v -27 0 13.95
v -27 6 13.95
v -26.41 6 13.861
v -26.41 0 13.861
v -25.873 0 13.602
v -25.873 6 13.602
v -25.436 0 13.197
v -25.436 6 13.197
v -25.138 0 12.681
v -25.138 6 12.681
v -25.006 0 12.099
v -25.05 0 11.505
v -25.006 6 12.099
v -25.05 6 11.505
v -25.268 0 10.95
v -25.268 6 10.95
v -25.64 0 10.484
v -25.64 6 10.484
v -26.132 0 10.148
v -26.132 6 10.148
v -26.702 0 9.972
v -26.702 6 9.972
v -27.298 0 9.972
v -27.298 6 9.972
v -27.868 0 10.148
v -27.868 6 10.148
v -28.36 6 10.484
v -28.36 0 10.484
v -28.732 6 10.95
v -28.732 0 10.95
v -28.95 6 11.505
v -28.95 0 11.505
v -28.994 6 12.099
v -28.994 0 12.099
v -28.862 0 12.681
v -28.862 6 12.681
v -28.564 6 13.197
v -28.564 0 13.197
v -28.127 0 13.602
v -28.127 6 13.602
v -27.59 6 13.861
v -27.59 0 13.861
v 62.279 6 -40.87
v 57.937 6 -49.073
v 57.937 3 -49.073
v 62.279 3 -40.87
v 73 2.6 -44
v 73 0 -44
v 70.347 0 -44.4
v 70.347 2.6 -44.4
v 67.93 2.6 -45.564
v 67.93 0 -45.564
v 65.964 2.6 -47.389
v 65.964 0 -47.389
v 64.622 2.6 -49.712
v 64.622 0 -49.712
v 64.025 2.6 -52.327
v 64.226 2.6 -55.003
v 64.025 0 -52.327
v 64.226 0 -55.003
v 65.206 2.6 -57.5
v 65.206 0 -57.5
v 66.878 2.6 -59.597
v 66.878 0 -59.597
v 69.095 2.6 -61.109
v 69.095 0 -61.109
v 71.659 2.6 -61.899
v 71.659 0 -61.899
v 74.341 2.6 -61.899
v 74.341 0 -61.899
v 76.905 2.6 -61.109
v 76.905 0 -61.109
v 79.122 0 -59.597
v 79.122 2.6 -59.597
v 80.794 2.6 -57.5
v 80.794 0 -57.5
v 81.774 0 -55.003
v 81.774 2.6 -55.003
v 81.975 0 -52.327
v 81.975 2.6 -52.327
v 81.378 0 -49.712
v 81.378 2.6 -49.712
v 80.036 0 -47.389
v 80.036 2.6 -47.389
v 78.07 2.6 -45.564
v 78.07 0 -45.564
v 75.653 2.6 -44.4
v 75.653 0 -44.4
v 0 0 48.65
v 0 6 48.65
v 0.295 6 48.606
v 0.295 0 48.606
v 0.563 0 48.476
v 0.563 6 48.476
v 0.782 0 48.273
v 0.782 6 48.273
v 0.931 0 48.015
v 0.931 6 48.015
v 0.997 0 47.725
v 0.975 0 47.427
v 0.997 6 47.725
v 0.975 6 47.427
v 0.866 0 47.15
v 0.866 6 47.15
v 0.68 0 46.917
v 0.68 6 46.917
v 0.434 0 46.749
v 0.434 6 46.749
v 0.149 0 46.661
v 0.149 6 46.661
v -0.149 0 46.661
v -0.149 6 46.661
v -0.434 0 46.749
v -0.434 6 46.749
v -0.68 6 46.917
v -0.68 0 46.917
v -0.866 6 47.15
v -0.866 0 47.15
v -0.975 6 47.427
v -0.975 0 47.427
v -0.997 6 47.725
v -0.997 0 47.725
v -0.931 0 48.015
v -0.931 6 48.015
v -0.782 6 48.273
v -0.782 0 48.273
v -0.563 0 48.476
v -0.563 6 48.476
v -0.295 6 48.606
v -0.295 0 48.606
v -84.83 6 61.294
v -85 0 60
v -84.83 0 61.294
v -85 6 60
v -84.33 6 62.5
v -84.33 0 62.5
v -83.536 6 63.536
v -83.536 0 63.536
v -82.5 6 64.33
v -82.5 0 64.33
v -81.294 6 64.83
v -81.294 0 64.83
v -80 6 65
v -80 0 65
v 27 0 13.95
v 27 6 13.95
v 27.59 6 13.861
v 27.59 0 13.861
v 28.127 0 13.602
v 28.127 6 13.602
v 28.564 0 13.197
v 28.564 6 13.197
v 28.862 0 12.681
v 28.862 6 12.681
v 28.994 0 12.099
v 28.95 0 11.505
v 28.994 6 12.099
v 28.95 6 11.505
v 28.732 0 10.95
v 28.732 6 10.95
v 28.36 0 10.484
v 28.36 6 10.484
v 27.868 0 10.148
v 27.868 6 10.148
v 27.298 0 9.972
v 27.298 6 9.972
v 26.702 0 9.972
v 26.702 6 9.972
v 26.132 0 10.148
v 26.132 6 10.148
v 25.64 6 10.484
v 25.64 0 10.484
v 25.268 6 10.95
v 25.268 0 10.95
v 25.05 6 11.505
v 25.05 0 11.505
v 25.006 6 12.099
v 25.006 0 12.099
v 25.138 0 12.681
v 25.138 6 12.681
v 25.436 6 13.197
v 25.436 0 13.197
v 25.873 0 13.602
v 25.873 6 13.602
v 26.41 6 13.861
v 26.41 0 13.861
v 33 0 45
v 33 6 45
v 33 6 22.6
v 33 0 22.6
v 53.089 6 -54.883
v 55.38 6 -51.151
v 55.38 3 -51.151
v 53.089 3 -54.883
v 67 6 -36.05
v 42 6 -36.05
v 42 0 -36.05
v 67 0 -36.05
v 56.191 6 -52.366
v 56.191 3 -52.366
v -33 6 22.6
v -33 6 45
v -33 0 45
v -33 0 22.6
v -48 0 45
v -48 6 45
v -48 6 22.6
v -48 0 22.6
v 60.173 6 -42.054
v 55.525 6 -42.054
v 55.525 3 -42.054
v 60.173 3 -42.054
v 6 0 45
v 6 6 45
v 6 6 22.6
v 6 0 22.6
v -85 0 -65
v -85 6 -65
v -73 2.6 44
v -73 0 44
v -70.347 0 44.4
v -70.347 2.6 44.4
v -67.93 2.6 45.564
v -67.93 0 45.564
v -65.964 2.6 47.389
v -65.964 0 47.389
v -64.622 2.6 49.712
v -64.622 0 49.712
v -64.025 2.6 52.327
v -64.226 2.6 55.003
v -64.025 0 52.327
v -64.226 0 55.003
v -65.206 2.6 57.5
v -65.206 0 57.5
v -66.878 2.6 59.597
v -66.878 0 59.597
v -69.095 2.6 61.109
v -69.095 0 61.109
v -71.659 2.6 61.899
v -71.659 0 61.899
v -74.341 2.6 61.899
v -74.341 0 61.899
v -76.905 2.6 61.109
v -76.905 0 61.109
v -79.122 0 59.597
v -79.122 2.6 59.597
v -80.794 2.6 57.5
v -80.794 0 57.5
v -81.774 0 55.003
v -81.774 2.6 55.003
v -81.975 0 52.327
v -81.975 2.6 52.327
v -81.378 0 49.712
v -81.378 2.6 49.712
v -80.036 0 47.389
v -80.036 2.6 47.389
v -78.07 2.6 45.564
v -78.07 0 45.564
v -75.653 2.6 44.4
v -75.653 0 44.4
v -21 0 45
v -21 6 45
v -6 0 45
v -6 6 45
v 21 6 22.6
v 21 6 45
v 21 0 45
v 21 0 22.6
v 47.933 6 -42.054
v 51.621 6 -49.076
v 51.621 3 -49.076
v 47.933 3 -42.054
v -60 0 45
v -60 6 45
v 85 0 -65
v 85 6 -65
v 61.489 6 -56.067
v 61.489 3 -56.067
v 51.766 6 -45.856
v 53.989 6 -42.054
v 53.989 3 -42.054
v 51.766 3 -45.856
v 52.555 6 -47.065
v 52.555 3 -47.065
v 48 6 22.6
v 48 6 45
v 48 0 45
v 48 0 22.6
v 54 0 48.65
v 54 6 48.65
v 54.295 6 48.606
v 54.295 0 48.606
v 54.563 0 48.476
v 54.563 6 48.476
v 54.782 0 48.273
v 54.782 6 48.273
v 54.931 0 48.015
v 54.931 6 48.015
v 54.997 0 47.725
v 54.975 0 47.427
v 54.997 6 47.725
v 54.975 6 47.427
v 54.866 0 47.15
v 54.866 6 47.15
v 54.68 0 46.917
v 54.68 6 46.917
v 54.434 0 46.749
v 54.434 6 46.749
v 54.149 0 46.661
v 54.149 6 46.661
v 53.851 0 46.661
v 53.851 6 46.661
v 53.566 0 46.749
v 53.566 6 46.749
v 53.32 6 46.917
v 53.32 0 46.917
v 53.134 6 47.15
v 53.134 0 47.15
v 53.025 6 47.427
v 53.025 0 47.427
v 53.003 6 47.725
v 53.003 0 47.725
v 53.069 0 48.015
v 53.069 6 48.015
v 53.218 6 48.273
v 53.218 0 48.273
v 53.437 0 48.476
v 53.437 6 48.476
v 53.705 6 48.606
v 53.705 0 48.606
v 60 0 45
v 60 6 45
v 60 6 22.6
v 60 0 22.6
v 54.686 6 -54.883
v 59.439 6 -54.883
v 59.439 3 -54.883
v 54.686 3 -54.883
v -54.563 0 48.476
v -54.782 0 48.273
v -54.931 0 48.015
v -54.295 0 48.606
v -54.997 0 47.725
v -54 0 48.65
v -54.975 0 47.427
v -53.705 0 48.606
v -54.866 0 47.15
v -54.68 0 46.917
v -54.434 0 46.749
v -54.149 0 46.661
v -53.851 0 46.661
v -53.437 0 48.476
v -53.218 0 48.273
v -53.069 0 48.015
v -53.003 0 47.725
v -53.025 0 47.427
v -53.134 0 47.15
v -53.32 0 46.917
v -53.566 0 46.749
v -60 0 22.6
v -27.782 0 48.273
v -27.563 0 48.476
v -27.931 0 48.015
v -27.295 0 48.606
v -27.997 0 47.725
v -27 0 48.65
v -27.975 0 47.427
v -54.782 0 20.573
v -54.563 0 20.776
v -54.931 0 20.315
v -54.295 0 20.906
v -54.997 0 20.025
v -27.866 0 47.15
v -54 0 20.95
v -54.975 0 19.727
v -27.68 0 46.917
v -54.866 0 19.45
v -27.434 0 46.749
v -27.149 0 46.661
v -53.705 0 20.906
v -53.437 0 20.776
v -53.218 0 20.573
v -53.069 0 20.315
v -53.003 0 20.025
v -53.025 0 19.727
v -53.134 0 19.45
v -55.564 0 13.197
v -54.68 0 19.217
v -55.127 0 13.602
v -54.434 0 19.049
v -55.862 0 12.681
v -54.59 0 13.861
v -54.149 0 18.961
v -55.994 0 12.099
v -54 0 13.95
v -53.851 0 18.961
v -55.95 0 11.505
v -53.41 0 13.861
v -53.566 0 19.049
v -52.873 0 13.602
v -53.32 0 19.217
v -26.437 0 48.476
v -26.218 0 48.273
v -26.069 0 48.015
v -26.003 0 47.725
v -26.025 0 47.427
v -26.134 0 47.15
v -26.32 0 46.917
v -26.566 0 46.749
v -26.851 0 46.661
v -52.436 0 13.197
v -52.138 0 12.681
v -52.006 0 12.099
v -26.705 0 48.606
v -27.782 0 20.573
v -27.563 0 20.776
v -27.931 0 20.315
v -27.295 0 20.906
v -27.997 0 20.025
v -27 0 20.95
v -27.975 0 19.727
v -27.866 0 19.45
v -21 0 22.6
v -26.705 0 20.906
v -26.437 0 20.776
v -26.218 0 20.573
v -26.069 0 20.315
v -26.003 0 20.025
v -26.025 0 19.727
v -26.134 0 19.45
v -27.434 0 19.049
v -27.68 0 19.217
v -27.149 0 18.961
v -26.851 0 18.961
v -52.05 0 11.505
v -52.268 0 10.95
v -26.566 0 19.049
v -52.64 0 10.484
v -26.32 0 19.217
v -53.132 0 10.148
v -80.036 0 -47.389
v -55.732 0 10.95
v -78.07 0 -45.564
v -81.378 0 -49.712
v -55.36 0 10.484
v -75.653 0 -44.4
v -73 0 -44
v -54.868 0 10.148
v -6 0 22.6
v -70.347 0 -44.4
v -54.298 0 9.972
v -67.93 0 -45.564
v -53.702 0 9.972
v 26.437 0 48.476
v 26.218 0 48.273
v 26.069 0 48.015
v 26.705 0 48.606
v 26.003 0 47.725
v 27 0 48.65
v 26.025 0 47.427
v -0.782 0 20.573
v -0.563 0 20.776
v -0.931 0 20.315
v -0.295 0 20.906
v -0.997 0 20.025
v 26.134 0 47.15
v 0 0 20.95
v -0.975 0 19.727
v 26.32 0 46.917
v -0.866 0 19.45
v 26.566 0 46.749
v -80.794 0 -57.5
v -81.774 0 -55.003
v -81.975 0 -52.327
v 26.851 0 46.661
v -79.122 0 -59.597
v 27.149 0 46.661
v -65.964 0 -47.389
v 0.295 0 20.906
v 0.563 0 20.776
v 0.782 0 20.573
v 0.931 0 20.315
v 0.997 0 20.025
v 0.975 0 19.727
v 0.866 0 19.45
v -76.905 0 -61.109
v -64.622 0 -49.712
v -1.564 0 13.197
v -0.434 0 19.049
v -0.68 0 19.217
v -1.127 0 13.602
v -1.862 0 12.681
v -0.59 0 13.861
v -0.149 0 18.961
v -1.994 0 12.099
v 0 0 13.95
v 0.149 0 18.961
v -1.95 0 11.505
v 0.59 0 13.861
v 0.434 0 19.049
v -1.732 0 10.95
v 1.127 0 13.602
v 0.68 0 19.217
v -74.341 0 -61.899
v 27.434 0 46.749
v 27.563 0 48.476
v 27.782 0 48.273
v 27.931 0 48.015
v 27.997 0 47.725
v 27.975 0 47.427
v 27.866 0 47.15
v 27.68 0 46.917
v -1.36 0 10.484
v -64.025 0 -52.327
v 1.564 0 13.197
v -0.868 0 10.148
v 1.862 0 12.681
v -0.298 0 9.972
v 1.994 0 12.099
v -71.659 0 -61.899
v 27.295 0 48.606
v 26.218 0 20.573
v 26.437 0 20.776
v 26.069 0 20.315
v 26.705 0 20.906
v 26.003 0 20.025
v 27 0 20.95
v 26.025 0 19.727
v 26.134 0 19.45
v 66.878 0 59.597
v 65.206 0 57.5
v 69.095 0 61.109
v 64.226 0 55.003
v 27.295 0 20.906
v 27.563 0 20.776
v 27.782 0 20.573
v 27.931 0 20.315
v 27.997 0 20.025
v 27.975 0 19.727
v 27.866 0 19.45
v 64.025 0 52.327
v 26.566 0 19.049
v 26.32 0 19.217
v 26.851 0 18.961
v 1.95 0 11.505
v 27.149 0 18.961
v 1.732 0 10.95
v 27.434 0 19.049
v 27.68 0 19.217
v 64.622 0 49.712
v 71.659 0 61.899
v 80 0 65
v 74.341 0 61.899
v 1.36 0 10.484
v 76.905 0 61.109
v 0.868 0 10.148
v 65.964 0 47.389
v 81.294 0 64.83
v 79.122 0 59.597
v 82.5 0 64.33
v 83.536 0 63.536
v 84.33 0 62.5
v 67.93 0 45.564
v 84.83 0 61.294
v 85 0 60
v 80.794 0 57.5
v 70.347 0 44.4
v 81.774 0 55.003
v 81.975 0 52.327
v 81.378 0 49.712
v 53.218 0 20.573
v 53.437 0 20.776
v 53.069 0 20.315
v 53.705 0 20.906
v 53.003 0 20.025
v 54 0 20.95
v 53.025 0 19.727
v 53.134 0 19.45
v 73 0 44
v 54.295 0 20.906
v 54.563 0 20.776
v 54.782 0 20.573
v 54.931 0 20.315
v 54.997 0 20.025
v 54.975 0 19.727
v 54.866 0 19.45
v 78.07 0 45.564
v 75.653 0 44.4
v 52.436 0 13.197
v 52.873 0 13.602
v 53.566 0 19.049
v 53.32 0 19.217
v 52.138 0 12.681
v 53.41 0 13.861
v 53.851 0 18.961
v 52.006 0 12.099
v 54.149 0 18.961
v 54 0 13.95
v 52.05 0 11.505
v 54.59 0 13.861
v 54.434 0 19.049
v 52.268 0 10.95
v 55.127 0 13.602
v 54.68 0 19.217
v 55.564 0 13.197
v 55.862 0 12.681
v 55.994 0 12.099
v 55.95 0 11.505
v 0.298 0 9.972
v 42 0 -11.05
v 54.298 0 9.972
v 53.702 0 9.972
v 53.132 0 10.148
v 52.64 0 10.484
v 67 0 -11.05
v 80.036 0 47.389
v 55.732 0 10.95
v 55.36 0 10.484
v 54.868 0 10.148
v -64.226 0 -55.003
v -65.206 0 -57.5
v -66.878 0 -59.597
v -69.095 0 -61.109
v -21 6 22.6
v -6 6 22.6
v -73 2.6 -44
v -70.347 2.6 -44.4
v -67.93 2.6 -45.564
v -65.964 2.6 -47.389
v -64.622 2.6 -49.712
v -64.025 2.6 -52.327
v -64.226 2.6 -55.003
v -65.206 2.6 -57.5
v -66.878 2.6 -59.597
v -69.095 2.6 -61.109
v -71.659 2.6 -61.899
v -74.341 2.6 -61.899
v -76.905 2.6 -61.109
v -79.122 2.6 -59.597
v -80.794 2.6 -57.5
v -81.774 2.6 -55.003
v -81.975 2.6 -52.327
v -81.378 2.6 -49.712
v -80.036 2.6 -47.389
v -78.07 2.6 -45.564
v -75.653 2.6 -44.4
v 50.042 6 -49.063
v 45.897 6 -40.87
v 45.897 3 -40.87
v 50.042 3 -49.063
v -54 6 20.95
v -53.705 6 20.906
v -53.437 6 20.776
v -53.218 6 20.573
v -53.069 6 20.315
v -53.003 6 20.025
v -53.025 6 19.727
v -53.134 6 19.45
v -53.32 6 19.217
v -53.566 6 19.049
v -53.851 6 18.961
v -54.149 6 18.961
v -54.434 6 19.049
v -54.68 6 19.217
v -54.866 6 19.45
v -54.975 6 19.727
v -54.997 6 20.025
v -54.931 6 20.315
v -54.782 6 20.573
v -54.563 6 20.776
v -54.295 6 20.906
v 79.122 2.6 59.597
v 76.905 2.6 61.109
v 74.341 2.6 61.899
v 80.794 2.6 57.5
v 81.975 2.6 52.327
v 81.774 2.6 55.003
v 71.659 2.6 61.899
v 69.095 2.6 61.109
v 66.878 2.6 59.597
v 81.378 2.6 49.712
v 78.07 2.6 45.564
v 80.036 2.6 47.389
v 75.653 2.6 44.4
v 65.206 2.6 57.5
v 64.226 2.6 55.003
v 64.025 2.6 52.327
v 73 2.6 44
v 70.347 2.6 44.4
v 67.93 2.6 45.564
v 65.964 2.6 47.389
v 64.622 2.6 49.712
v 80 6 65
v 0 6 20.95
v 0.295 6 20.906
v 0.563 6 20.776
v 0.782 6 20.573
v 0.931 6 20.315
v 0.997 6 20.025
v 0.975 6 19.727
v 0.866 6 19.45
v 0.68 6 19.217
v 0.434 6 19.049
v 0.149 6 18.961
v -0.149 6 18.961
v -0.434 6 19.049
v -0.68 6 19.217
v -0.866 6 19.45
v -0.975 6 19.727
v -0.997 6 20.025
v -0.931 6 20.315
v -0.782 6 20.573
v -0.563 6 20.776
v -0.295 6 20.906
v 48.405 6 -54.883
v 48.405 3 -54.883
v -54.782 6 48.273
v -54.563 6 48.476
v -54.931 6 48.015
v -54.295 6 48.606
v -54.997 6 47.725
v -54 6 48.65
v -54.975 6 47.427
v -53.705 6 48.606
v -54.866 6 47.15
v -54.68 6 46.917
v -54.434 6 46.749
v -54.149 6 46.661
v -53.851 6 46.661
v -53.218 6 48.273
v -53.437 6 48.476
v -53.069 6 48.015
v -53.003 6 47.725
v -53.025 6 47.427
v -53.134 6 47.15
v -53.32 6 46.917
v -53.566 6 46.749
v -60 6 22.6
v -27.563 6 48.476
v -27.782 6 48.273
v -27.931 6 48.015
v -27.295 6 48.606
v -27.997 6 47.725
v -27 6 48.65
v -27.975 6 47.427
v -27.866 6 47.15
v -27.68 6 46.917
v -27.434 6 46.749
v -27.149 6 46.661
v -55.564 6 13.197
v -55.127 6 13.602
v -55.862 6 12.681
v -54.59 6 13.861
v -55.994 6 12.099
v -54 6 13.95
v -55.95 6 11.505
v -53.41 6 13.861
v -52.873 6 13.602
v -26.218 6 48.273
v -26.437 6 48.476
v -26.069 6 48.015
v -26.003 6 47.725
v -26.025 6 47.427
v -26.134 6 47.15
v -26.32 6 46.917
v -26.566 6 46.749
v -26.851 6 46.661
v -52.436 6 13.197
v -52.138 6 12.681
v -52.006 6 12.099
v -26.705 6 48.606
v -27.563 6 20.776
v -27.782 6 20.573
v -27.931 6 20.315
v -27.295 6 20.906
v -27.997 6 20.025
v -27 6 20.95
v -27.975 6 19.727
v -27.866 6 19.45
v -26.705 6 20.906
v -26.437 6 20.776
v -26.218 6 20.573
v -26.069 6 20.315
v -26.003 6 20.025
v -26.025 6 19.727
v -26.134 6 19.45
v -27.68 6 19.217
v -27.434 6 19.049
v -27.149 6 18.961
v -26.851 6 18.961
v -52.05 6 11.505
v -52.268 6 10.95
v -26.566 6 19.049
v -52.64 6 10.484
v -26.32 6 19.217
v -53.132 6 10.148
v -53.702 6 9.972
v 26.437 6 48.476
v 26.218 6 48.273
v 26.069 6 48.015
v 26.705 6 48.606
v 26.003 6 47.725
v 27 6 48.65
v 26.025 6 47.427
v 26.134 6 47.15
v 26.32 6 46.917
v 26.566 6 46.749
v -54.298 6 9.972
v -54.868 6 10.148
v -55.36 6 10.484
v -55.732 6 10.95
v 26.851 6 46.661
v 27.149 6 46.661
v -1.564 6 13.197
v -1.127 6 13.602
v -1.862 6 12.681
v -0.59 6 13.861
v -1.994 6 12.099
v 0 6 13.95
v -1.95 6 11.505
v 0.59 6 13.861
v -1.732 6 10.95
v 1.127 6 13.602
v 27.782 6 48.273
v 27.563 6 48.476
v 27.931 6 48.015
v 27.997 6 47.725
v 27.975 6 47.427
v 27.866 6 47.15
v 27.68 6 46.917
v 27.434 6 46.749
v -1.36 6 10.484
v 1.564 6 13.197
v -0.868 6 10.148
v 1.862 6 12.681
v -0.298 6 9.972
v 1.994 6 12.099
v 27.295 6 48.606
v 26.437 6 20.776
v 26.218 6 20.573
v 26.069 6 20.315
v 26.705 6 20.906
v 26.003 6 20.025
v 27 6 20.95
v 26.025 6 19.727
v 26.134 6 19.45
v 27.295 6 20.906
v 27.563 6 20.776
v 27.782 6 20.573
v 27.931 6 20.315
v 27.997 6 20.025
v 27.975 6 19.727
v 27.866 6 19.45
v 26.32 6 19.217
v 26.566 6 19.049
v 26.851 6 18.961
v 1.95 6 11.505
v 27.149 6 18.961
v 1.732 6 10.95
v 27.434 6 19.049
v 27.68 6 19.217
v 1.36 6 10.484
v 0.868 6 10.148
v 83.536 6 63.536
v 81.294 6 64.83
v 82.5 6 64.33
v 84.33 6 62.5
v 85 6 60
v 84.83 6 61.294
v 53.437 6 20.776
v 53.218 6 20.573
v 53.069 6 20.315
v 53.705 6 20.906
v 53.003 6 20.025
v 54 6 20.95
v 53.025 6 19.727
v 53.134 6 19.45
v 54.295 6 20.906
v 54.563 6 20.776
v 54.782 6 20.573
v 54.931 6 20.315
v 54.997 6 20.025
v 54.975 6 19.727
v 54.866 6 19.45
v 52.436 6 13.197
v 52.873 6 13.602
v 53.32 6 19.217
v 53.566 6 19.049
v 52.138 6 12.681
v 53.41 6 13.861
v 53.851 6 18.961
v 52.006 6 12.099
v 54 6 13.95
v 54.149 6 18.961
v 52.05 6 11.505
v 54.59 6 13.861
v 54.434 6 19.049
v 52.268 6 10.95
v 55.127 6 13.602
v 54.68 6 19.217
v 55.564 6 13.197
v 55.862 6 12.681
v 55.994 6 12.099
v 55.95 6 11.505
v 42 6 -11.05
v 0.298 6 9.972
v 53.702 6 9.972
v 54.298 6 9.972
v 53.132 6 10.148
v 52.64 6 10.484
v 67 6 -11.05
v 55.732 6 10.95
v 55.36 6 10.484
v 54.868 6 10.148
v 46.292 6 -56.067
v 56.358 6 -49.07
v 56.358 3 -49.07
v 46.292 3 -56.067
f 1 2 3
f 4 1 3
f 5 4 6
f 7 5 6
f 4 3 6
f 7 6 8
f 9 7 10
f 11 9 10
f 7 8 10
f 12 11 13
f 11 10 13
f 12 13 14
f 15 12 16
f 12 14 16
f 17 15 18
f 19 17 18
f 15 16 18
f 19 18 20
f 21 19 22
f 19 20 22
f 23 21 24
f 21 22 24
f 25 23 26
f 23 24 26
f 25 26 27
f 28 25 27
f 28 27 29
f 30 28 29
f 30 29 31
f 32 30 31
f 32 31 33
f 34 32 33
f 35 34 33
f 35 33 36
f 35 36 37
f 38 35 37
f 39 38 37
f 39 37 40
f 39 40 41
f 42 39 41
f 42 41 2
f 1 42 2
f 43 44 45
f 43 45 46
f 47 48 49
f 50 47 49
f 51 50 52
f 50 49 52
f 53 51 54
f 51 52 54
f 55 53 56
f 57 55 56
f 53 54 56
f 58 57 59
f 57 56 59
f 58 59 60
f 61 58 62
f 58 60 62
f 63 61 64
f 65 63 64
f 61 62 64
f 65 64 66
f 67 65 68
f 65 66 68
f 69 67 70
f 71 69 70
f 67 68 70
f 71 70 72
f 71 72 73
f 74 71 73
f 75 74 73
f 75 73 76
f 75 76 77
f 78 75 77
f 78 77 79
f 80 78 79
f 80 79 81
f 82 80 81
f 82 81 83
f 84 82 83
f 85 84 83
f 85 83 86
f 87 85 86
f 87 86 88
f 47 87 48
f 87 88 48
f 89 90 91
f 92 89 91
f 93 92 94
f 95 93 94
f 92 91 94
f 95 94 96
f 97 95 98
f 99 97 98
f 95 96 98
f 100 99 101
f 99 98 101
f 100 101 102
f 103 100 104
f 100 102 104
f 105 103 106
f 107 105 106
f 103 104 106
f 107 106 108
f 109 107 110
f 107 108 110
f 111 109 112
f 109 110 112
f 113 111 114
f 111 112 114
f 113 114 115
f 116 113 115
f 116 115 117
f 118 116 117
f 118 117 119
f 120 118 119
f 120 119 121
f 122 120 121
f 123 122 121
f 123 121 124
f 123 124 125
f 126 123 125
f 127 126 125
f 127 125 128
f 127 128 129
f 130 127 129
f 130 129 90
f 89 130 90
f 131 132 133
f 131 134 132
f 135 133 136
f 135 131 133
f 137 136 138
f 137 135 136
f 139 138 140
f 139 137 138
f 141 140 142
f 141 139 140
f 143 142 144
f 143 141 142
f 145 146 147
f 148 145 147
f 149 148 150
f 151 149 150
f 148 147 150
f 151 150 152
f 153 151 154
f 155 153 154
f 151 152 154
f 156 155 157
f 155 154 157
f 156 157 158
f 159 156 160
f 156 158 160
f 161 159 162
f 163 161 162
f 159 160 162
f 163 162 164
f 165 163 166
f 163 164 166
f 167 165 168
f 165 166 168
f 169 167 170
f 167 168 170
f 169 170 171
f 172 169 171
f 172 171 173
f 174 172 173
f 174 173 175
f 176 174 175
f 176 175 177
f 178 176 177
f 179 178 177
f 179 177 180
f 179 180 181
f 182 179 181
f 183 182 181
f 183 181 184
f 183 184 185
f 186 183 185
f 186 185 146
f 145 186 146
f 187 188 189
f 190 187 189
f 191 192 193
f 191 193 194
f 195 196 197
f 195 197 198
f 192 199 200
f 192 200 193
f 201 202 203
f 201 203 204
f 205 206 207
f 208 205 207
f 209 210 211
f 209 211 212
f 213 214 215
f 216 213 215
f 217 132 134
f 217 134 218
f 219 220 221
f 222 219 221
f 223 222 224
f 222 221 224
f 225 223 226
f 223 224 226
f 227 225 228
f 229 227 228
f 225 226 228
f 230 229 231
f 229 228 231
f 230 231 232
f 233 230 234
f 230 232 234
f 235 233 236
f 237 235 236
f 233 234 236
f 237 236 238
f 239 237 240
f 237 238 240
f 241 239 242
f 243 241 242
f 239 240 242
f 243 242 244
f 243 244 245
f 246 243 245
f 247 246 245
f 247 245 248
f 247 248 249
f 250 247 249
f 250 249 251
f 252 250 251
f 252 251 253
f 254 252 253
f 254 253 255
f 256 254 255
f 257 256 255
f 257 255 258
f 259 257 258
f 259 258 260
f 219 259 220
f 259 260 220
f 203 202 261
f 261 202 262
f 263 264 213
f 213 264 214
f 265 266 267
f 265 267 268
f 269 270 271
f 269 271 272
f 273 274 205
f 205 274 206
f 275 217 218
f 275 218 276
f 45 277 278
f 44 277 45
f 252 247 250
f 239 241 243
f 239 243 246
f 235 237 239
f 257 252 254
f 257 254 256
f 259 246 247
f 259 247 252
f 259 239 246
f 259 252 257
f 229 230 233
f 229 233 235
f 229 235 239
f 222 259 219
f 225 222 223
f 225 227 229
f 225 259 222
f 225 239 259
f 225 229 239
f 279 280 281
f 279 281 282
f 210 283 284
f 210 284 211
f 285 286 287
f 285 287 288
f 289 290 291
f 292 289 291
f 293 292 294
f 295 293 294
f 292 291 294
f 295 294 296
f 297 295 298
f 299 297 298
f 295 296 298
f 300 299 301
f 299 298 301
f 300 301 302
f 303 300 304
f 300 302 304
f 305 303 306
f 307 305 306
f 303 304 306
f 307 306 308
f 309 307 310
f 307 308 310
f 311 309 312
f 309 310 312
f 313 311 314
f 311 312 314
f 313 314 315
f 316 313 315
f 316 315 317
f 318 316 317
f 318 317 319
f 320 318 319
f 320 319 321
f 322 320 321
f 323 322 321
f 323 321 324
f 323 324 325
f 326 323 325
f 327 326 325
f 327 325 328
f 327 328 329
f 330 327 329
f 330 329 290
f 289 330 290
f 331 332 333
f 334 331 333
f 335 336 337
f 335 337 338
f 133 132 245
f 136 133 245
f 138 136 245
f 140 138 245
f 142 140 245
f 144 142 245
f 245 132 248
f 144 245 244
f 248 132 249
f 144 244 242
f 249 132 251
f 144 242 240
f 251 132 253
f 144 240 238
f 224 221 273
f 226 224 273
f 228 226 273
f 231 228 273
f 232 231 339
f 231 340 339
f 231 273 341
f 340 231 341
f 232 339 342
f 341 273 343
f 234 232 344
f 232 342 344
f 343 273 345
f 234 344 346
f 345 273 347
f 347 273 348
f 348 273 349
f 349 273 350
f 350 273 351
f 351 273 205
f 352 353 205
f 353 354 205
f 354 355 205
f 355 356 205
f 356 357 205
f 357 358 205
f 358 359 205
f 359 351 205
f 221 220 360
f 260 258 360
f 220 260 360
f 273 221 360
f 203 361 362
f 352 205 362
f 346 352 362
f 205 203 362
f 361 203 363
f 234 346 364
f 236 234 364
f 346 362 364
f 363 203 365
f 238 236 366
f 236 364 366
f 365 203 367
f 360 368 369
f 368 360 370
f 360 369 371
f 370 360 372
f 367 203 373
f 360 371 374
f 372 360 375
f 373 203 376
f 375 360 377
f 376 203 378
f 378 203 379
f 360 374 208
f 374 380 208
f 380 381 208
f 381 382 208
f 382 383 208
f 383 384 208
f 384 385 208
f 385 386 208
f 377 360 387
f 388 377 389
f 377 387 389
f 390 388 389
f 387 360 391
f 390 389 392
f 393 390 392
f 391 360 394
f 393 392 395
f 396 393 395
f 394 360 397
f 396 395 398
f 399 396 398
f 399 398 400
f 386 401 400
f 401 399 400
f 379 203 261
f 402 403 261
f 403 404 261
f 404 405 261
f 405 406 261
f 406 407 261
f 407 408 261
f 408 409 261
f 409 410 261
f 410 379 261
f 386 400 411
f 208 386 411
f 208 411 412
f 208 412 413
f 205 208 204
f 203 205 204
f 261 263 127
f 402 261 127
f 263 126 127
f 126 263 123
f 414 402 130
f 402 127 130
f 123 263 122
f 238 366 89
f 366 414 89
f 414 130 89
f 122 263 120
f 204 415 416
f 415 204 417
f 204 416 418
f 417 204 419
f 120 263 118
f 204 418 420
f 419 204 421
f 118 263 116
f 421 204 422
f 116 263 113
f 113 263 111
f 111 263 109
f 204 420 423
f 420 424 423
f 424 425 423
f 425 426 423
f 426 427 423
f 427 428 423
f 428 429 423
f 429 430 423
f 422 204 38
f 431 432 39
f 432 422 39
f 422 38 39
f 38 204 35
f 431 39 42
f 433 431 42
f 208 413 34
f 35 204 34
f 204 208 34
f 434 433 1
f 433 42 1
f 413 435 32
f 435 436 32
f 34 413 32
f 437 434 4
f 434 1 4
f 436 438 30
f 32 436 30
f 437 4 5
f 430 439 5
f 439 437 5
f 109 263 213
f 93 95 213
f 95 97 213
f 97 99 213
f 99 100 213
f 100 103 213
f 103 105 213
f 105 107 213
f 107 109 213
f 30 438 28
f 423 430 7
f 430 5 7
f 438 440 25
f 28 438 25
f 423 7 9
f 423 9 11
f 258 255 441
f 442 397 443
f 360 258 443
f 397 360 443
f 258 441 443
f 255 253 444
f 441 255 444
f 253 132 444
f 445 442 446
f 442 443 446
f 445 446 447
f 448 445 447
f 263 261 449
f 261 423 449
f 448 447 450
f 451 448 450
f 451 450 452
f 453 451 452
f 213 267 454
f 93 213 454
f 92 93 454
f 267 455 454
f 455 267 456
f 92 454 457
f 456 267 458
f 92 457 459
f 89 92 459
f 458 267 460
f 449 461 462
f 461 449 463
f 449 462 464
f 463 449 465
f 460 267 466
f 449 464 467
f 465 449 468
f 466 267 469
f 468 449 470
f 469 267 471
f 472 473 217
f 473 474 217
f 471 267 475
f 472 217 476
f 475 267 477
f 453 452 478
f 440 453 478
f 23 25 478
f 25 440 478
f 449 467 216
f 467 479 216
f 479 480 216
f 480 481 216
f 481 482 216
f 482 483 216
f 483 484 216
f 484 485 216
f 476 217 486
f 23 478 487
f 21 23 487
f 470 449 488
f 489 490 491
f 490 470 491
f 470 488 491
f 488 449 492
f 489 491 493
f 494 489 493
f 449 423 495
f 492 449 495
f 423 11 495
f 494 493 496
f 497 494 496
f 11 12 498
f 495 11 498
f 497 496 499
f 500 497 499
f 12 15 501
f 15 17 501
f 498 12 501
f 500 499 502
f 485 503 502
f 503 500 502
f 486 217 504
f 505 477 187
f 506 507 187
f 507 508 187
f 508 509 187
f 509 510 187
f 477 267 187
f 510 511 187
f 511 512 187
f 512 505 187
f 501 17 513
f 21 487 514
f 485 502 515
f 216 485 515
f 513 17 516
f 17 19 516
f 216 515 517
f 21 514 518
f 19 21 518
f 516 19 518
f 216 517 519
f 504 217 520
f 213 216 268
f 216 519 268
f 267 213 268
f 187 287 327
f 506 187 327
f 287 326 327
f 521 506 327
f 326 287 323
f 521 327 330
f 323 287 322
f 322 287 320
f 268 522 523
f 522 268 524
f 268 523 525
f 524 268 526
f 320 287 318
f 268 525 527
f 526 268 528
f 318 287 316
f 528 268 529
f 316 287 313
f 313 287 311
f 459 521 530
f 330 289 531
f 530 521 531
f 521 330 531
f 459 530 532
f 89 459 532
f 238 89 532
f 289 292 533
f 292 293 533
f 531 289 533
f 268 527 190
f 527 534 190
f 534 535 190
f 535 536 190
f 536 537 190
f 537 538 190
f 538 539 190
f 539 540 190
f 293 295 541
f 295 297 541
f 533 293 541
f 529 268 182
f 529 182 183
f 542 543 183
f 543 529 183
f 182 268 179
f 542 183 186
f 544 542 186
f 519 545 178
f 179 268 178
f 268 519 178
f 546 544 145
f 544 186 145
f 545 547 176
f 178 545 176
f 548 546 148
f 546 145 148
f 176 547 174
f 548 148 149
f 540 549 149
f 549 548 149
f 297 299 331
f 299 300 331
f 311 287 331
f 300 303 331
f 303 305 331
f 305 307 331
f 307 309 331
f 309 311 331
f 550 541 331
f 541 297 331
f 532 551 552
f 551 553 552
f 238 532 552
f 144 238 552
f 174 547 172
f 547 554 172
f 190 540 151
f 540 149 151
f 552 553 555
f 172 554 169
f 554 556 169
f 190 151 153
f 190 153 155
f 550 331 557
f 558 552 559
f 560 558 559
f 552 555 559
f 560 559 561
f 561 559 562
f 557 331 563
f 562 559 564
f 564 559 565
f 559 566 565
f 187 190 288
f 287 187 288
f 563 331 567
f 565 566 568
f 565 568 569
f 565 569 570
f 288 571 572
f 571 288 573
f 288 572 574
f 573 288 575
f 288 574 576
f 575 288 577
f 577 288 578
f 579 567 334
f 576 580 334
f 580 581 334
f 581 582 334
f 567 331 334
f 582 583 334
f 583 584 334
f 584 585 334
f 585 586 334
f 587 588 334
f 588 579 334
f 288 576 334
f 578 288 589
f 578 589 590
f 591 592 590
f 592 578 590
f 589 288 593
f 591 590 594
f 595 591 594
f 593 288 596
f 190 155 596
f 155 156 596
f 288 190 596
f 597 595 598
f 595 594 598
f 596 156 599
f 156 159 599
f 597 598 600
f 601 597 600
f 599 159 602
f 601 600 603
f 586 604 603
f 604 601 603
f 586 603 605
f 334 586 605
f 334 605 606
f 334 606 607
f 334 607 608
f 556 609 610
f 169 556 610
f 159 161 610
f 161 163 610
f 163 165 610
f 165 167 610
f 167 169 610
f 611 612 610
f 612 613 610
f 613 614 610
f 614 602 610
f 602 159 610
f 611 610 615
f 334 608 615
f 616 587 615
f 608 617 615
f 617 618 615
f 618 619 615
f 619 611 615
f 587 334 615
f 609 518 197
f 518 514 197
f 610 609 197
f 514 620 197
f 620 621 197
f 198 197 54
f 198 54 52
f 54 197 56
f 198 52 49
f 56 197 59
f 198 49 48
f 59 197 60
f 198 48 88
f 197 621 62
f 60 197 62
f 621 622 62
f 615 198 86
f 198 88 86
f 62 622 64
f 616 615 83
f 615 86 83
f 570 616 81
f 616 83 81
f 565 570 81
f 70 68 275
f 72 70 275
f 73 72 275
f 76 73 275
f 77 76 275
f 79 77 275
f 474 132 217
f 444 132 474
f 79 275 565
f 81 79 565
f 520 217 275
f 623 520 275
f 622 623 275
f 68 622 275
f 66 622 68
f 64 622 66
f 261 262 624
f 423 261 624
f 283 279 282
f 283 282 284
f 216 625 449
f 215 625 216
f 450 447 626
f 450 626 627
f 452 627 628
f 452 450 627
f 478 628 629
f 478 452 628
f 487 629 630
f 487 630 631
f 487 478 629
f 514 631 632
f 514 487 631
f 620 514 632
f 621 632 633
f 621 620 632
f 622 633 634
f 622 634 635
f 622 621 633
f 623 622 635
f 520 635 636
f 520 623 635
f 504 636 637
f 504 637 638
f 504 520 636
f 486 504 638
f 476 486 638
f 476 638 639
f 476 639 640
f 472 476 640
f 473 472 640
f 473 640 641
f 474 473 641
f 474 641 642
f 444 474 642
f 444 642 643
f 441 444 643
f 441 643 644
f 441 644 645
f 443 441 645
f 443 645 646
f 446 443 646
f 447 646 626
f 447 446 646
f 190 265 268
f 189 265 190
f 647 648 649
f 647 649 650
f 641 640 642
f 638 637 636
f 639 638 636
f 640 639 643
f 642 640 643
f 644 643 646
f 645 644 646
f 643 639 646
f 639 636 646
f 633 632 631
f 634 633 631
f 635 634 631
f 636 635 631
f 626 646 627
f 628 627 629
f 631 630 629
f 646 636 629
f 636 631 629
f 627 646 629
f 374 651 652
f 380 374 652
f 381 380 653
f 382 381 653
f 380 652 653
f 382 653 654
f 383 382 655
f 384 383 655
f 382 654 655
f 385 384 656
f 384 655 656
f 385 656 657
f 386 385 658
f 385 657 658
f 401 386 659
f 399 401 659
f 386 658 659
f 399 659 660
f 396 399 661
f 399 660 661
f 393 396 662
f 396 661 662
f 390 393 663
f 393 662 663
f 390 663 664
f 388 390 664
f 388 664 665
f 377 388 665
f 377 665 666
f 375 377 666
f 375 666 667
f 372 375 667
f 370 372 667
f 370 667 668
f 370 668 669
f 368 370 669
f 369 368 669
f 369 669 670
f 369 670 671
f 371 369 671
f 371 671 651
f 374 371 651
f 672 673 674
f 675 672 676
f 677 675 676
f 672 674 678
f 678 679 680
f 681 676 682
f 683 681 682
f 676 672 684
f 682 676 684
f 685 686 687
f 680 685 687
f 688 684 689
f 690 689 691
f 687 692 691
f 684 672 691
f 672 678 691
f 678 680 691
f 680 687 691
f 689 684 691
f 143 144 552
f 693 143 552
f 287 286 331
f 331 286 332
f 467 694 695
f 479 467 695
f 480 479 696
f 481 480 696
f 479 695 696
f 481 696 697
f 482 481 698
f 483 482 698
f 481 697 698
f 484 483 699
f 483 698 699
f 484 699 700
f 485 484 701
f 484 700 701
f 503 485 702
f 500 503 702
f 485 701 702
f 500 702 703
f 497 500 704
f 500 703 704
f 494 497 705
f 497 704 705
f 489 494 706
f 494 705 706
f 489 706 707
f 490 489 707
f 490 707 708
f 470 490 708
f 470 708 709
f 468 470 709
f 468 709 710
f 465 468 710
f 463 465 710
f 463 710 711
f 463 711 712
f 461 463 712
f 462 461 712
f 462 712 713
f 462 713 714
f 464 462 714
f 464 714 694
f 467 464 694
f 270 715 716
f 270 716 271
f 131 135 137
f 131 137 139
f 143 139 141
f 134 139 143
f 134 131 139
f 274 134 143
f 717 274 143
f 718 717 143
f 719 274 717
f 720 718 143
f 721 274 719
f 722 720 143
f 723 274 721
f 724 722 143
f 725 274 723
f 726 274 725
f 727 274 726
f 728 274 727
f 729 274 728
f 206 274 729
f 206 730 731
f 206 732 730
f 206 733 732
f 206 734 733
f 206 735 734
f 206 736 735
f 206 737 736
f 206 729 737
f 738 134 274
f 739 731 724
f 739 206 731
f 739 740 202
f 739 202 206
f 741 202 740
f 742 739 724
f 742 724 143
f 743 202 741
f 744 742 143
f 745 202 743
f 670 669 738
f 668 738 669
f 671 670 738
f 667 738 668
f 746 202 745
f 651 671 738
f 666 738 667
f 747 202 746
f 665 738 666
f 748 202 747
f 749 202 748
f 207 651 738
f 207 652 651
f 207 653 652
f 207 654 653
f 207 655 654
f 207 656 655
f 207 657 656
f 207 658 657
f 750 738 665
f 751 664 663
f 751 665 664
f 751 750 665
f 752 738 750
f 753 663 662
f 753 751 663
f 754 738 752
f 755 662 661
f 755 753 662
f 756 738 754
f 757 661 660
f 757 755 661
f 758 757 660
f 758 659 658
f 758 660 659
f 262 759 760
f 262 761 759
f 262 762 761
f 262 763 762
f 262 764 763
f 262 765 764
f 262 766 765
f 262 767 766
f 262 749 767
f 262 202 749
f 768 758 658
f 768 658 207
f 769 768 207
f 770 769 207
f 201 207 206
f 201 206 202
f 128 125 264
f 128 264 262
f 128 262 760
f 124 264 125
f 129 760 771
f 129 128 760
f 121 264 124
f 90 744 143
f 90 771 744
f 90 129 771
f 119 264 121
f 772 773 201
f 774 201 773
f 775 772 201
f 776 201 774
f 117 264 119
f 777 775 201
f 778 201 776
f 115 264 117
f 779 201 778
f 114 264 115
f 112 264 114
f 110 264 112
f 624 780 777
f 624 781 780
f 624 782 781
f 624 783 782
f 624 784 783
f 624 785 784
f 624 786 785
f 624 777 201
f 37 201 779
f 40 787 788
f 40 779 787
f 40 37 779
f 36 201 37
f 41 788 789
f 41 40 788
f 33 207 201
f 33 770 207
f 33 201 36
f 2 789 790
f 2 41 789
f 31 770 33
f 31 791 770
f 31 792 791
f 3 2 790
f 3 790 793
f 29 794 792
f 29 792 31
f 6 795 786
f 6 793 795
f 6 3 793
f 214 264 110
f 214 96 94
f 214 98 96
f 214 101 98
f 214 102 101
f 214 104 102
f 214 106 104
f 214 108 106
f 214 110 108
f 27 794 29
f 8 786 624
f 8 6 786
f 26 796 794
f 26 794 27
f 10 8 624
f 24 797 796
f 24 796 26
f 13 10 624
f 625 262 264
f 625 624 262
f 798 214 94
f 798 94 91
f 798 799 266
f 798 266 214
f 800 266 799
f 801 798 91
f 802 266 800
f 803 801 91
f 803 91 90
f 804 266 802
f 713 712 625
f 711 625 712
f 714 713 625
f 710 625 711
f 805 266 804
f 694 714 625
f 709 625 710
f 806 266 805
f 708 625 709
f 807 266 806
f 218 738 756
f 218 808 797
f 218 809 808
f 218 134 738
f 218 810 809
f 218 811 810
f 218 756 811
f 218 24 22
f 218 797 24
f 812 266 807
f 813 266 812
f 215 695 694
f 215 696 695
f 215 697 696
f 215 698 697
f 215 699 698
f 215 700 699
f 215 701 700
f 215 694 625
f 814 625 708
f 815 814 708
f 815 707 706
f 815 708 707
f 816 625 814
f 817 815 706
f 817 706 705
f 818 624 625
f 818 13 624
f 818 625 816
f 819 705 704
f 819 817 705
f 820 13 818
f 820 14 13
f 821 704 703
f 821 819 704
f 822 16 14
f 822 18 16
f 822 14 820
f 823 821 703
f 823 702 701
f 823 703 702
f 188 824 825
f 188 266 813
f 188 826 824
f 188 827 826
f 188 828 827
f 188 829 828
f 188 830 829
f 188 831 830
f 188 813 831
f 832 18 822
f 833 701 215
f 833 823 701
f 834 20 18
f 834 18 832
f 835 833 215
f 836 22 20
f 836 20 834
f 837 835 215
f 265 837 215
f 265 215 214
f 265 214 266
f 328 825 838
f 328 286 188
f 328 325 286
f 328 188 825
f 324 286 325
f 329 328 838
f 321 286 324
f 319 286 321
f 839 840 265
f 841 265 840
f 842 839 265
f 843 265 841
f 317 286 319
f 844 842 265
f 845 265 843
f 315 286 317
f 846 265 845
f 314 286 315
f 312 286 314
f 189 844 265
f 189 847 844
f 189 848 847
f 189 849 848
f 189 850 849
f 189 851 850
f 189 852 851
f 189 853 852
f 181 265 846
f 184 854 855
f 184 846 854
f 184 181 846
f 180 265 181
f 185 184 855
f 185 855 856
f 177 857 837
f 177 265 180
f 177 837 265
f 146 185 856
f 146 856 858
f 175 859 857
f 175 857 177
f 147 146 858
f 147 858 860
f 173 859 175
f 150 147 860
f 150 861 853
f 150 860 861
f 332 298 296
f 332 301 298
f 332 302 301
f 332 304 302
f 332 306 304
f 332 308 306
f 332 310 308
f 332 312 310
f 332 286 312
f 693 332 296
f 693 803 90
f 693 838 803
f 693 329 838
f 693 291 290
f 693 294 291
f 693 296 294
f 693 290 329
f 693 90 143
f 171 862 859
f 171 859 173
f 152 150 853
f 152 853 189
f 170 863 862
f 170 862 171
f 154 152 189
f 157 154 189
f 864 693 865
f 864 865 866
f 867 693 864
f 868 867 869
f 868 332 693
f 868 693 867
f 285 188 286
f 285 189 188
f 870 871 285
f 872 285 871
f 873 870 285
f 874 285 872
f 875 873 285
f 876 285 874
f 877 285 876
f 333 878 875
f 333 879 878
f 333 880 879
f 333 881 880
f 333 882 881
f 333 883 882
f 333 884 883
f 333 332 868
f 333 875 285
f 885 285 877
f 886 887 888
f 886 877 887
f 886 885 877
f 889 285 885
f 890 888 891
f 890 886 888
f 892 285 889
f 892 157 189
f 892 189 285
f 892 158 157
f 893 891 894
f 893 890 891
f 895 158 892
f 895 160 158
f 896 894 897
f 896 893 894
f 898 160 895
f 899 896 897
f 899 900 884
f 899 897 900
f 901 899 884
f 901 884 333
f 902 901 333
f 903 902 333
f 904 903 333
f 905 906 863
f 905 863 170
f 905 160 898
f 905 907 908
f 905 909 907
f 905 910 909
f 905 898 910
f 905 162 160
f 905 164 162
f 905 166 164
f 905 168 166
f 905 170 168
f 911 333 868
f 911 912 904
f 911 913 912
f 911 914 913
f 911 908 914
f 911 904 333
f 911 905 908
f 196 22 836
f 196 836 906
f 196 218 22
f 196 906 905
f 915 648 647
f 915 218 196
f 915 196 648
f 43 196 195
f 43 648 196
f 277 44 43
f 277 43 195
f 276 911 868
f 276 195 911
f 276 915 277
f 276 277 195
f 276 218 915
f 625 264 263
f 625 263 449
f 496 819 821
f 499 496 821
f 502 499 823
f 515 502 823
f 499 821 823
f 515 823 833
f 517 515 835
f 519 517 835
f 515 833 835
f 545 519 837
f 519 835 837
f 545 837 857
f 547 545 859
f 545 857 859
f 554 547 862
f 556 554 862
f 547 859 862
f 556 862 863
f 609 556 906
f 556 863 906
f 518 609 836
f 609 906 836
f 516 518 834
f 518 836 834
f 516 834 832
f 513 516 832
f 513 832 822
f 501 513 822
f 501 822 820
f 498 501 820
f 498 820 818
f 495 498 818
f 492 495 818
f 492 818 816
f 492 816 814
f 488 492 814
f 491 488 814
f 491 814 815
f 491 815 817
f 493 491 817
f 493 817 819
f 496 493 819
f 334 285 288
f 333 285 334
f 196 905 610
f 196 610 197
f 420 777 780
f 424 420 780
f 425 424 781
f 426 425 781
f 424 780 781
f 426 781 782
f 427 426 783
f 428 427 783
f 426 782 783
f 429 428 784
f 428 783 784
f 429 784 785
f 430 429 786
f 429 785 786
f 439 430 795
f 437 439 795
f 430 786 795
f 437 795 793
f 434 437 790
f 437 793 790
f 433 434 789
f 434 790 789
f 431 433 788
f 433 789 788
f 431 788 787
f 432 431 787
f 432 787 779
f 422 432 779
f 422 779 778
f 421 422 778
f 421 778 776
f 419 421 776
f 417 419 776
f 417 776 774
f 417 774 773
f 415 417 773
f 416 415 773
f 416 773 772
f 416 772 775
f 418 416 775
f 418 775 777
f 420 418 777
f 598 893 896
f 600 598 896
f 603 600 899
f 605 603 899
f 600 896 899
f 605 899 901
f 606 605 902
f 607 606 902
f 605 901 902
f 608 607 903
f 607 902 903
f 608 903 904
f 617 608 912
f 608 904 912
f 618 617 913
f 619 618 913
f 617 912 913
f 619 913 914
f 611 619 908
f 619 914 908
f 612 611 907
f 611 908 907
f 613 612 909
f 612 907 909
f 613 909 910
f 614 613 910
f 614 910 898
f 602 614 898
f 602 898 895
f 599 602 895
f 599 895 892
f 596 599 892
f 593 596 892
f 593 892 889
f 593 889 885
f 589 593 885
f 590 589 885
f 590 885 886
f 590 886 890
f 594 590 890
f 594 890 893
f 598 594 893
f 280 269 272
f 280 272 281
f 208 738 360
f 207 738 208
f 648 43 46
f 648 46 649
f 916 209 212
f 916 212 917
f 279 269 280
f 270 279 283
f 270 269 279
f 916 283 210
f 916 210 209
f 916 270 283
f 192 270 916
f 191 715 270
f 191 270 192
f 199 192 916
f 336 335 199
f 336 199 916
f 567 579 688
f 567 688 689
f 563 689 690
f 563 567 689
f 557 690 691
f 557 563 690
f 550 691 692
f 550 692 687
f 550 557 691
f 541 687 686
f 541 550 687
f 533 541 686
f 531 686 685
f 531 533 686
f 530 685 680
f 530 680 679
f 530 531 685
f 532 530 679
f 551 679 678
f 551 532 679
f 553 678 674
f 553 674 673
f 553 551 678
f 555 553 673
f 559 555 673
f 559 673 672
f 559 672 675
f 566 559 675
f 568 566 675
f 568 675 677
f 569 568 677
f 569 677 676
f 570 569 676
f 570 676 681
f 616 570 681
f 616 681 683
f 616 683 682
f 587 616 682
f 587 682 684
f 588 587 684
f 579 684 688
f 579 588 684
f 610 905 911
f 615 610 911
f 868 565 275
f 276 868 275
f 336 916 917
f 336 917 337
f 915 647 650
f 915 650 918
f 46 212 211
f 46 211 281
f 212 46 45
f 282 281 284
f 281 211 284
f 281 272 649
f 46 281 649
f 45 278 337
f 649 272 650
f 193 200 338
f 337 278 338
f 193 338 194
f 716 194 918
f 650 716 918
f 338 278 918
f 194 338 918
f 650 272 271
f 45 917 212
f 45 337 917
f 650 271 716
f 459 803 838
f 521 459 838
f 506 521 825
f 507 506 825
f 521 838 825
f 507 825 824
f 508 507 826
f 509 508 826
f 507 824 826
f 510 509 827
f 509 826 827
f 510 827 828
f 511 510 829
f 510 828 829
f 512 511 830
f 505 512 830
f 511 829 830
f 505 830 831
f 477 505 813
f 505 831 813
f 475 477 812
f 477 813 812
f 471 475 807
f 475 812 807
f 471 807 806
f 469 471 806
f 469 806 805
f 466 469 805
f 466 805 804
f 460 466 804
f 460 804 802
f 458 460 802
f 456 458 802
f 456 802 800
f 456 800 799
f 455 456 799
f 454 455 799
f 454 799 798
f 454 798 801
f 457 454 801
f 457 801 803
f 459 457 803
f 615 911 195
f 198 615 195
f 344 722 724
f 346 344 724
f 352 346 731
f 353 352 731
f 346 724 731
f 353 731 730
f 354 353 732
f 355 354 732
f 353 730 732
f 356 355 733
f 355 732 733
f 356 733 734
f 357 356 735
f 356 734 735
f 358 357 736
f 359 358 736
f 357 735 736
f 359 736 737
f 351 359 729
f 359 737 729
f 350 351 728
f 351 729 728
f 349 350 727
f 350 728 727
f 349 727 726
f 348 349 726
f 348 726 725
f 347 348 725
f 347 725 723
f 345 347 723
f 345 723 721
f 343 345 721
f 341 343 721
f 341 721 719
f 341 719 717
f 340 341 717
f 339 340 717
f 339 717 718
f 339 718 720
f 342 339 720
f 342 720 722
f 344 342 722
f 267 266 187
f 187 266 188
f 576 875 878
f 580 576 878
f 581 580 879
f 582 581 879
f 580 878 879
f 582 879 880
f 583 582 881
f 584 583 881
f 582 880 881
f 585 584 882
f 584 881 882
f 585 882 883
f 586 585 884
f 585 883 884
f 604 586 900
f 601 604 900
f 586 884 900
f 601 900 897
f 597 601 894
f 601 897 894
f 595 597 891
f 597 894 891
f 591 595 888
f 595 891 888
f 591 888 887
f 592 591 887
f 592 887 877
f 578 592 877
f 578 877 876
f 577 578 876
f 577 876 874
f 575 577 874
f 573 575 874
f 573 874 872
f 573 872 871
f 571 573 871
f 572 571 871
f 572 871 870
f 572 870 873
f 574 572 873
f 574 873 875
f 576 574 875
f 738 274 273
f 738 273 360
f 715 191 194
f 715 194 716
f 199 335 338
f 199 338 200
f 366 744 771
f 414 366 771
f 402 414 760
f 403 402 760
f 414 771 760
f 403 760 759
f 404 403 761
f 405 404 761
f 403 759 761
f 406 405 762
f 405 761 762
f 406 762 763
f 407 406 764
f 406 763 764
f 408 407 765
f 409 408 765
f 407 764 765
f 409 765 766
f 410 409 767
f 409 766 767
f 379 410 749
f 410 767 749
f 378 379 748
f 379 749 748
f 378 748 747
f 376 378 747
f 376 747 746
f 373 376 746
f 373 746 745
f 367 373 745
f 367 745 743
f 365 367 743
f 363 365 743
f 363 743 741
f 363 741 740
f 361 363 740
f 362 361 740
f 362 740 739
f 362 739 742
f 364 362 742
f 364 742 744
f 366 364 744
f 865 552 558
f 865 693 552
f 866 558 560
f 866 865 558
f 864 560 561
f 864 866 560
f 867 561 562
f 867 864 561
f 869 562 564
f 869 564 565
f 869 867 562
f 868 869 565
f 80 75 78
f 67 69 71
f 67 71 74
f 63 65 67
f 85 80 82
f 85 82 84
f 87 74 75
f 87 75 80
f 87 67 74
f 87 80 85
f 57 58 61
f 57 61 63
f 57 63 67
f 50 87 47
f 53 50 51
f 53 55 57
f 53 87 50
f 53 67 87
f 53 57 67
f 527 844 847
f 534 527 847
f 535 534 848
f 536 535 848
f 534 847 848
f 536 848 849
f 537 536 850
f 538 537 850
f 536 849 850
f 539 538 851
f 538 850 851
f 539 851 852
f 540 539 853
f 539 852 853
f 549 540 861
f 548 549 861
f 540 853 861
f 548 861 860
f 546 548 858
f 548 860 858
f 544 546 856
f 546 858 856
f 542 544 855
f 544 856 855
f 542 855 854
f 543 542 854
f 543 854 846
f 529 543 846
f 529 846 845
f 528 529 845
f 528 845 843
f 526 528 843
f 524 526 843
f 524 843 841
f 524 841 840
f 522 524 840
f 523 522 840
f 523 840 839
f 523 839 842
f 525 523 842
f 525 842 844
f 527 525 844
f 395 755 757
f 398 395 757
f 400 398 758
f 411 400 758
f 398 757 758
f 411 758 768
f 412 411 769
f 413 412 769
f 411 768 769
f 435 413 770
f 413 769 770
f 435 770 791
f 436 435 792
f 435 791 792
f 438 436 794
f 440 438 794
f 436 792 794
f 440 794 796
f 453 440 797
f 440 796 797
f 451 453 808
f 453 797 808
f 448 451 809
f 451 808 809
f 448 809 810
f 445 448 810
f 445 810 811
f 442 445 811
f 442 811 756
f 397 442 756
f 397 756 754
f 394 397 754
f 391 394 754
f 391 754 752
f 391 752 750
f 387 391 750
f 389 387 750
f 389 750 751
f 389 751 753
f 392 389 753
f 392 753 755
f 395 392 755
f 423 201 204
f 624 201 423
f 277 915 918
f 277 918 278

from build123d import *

# Parameters (mm, degrees)
SKETCH1_W               = 170
SKETCH1_H               = 130
BOSS_EXTRUDE1_DEPTH     = 6
SKETCH2_R               = 1
SKETCH2_R_2             = 2
SKETCH2_W               = 12
SKETCH2_H               = 22.4
CUT_EXTRUDE1_DEPTH      = 10
LPATTERN1_COUNT         = 5
LPATTERN1_PITCH         = 27
SKETCH8_W               = 25
SKETCH8_H               = 25
CUT_EXTRUDE5_DEPTH      = 108.172757733
FILLET2_R               = 5
SKETCH10_R              = 9
CUT_EXTRUDE6_DEPTH      = 2.6
MIRROR2_COPY_1_SKETCH_R = 9
MIRROR2_COPY_1_DEPTH    = 2.6
CUT_EXTRUDE7_DEPTH      = 3


with BuildPart() as part:
    # Sketch1 → Boss-Extrude1 (new body)
    with BuildSketch(Plane(origin=(0, 0, 0), x_dir=(1, 0, 0), z_dir=(0, 1, 0))):
        Rectangle(SKETCH1_W, SKETCH1_H)
    extrude(amount=BOSS_EXTRUDE1_DEPTH)

    # Sketch2 → Cut-Extrude1 (cut)
    with BuildSketch(Plane(origin=(0, 6, 0), x_dir=(1, 0, 0), z_dir=(0, 1, 0))):
        with Locations(Location((-54, -19.95, 0), (0, 0, 270))):
            Circle(SKETCH2_R)
        with Locations(Location((-54, -47.65, 0), (0, 0, 270))):
            Circle(SKETCH2_R)
        with Locations(Location((-54, -11.95, 0), (0, 0, 270))):
            Circle(SKETCH2_R_2)
        with Locations((-54, -33.8)):
            Rectangle(SKETCH2_W, SKETCH2_H)
    cut_extrude1 = extrude(amount=-CUT_EXTRUDE1_DEPTH, mode=Mode.SUBTRACT)

    # LPattern1: Cut-Extrude1 ×5
    with Locations(*[(i * LPATTERN1_PITCH, 0, 0) for i in range(1, LPATTERN1_COUNT)]):
        add(cut_extrude1, mode=Mode.SUBTRACT)

    # Sketch8 → Cut-Extrude5 (cut, through all)
    with BuildSketch(Plane(origin=(0, 6, 0), x_dir=(1, 0, 0), z_dir=(0, 1, 0))):
        with Locations((54.5, 23.55)):
            Rectangle(SKETCH8_W, SKETCH8_H)
    extrude(amount=-CUT_EXTRUDE5_DEPTH, mode=Mode.SUBTRACT)

    # Fillet2
    fillet2_edges = [part.edges().sort_by_distance(p)[0] for p in [
        (85, 3, 65),
        (-85, 3, 65),
    ]]
    fillet(fillet2_edges, radius=FILLET2_R)

    # Sketch10 → Cut-Extrude6 (cut)
    with BuildSketch(Plane.XZ):
        with Locations(Location((-73, 53, 0), (0, 0, 270))):
            Circle(SKETCH10_R)
    cut_extrude6 = extrude(amount=-CUT_EXTRUDE6_DEPTH, mode=Mode.SUBTRACT)

    # Mirror1: Cut-Extrude6 across plane
    add(cut_extrude6.mirror(Plane(origin=(0, 0, 0), x_dir=(0, 0, 1), z_dir=(1, 0, 0))), mode=Mode.SUBTRACT)

    # Mirror2: Cut-Extrude6 across plane
    add(cut_extrude6.mirror(Plane.XY), mode=Mode.SUBTRACT)

    # Mirror2 copy 1 sketch → Mirror2 copy 1 (cut)
    with BuildSketch(Plane(origin=(0, 0, 0), x_dir=(-1, 0, 0), z_dir=(0, -1, 0))):
        with Locations(Location((-73, 53, 0), (0, 0, 270))):
            Circle(MIRROR2_COPY_1_SKETCH_R)
    extrude(amount=-MIRROR2_COPY_1_DEPTH, mode=Mode.SUBTRACT)

    # Sketch11 → Cut-Extrude7 (cut)
    with BuildSketch(Plane(origin=(0, 6, 0), x_dir=(1, 0, 0), z_dir=(0, 1, 0))):
        Polygon((45.897368421, 40.869502872), (50.042105263, 49.063376227), (46.292105263, 56.066871293), (61.489473684, 56.066871293), (57.936842105, 49.072627872), (62.278947368, 40.869502872), align=None)
        Polygon((47.932730263, 42.053713398), (53.989473684, 42.053713398), (51.765995066, 45.856139385), (52.55546875, 47.065020964), (55.525246711, 42.053713398), (60.17265625, 42.053713398), (56.357894737, 49.069543991), (59.438692434, 54.882660767), (54.686430921, 54.882660767), (56.191365132, 52.366213398), (55.380304276, 51.151164056), (53.088980263, 54.882660767), (48.404564145, 54.882660767), (51.621052632, 49.075711754), align=None, mode=Mode.SUBTRACT)
    extrude(amount=-CUT_EXTRUDE7_DEPTH, mode=Mode.SUBTRACT)


solid = part.part
